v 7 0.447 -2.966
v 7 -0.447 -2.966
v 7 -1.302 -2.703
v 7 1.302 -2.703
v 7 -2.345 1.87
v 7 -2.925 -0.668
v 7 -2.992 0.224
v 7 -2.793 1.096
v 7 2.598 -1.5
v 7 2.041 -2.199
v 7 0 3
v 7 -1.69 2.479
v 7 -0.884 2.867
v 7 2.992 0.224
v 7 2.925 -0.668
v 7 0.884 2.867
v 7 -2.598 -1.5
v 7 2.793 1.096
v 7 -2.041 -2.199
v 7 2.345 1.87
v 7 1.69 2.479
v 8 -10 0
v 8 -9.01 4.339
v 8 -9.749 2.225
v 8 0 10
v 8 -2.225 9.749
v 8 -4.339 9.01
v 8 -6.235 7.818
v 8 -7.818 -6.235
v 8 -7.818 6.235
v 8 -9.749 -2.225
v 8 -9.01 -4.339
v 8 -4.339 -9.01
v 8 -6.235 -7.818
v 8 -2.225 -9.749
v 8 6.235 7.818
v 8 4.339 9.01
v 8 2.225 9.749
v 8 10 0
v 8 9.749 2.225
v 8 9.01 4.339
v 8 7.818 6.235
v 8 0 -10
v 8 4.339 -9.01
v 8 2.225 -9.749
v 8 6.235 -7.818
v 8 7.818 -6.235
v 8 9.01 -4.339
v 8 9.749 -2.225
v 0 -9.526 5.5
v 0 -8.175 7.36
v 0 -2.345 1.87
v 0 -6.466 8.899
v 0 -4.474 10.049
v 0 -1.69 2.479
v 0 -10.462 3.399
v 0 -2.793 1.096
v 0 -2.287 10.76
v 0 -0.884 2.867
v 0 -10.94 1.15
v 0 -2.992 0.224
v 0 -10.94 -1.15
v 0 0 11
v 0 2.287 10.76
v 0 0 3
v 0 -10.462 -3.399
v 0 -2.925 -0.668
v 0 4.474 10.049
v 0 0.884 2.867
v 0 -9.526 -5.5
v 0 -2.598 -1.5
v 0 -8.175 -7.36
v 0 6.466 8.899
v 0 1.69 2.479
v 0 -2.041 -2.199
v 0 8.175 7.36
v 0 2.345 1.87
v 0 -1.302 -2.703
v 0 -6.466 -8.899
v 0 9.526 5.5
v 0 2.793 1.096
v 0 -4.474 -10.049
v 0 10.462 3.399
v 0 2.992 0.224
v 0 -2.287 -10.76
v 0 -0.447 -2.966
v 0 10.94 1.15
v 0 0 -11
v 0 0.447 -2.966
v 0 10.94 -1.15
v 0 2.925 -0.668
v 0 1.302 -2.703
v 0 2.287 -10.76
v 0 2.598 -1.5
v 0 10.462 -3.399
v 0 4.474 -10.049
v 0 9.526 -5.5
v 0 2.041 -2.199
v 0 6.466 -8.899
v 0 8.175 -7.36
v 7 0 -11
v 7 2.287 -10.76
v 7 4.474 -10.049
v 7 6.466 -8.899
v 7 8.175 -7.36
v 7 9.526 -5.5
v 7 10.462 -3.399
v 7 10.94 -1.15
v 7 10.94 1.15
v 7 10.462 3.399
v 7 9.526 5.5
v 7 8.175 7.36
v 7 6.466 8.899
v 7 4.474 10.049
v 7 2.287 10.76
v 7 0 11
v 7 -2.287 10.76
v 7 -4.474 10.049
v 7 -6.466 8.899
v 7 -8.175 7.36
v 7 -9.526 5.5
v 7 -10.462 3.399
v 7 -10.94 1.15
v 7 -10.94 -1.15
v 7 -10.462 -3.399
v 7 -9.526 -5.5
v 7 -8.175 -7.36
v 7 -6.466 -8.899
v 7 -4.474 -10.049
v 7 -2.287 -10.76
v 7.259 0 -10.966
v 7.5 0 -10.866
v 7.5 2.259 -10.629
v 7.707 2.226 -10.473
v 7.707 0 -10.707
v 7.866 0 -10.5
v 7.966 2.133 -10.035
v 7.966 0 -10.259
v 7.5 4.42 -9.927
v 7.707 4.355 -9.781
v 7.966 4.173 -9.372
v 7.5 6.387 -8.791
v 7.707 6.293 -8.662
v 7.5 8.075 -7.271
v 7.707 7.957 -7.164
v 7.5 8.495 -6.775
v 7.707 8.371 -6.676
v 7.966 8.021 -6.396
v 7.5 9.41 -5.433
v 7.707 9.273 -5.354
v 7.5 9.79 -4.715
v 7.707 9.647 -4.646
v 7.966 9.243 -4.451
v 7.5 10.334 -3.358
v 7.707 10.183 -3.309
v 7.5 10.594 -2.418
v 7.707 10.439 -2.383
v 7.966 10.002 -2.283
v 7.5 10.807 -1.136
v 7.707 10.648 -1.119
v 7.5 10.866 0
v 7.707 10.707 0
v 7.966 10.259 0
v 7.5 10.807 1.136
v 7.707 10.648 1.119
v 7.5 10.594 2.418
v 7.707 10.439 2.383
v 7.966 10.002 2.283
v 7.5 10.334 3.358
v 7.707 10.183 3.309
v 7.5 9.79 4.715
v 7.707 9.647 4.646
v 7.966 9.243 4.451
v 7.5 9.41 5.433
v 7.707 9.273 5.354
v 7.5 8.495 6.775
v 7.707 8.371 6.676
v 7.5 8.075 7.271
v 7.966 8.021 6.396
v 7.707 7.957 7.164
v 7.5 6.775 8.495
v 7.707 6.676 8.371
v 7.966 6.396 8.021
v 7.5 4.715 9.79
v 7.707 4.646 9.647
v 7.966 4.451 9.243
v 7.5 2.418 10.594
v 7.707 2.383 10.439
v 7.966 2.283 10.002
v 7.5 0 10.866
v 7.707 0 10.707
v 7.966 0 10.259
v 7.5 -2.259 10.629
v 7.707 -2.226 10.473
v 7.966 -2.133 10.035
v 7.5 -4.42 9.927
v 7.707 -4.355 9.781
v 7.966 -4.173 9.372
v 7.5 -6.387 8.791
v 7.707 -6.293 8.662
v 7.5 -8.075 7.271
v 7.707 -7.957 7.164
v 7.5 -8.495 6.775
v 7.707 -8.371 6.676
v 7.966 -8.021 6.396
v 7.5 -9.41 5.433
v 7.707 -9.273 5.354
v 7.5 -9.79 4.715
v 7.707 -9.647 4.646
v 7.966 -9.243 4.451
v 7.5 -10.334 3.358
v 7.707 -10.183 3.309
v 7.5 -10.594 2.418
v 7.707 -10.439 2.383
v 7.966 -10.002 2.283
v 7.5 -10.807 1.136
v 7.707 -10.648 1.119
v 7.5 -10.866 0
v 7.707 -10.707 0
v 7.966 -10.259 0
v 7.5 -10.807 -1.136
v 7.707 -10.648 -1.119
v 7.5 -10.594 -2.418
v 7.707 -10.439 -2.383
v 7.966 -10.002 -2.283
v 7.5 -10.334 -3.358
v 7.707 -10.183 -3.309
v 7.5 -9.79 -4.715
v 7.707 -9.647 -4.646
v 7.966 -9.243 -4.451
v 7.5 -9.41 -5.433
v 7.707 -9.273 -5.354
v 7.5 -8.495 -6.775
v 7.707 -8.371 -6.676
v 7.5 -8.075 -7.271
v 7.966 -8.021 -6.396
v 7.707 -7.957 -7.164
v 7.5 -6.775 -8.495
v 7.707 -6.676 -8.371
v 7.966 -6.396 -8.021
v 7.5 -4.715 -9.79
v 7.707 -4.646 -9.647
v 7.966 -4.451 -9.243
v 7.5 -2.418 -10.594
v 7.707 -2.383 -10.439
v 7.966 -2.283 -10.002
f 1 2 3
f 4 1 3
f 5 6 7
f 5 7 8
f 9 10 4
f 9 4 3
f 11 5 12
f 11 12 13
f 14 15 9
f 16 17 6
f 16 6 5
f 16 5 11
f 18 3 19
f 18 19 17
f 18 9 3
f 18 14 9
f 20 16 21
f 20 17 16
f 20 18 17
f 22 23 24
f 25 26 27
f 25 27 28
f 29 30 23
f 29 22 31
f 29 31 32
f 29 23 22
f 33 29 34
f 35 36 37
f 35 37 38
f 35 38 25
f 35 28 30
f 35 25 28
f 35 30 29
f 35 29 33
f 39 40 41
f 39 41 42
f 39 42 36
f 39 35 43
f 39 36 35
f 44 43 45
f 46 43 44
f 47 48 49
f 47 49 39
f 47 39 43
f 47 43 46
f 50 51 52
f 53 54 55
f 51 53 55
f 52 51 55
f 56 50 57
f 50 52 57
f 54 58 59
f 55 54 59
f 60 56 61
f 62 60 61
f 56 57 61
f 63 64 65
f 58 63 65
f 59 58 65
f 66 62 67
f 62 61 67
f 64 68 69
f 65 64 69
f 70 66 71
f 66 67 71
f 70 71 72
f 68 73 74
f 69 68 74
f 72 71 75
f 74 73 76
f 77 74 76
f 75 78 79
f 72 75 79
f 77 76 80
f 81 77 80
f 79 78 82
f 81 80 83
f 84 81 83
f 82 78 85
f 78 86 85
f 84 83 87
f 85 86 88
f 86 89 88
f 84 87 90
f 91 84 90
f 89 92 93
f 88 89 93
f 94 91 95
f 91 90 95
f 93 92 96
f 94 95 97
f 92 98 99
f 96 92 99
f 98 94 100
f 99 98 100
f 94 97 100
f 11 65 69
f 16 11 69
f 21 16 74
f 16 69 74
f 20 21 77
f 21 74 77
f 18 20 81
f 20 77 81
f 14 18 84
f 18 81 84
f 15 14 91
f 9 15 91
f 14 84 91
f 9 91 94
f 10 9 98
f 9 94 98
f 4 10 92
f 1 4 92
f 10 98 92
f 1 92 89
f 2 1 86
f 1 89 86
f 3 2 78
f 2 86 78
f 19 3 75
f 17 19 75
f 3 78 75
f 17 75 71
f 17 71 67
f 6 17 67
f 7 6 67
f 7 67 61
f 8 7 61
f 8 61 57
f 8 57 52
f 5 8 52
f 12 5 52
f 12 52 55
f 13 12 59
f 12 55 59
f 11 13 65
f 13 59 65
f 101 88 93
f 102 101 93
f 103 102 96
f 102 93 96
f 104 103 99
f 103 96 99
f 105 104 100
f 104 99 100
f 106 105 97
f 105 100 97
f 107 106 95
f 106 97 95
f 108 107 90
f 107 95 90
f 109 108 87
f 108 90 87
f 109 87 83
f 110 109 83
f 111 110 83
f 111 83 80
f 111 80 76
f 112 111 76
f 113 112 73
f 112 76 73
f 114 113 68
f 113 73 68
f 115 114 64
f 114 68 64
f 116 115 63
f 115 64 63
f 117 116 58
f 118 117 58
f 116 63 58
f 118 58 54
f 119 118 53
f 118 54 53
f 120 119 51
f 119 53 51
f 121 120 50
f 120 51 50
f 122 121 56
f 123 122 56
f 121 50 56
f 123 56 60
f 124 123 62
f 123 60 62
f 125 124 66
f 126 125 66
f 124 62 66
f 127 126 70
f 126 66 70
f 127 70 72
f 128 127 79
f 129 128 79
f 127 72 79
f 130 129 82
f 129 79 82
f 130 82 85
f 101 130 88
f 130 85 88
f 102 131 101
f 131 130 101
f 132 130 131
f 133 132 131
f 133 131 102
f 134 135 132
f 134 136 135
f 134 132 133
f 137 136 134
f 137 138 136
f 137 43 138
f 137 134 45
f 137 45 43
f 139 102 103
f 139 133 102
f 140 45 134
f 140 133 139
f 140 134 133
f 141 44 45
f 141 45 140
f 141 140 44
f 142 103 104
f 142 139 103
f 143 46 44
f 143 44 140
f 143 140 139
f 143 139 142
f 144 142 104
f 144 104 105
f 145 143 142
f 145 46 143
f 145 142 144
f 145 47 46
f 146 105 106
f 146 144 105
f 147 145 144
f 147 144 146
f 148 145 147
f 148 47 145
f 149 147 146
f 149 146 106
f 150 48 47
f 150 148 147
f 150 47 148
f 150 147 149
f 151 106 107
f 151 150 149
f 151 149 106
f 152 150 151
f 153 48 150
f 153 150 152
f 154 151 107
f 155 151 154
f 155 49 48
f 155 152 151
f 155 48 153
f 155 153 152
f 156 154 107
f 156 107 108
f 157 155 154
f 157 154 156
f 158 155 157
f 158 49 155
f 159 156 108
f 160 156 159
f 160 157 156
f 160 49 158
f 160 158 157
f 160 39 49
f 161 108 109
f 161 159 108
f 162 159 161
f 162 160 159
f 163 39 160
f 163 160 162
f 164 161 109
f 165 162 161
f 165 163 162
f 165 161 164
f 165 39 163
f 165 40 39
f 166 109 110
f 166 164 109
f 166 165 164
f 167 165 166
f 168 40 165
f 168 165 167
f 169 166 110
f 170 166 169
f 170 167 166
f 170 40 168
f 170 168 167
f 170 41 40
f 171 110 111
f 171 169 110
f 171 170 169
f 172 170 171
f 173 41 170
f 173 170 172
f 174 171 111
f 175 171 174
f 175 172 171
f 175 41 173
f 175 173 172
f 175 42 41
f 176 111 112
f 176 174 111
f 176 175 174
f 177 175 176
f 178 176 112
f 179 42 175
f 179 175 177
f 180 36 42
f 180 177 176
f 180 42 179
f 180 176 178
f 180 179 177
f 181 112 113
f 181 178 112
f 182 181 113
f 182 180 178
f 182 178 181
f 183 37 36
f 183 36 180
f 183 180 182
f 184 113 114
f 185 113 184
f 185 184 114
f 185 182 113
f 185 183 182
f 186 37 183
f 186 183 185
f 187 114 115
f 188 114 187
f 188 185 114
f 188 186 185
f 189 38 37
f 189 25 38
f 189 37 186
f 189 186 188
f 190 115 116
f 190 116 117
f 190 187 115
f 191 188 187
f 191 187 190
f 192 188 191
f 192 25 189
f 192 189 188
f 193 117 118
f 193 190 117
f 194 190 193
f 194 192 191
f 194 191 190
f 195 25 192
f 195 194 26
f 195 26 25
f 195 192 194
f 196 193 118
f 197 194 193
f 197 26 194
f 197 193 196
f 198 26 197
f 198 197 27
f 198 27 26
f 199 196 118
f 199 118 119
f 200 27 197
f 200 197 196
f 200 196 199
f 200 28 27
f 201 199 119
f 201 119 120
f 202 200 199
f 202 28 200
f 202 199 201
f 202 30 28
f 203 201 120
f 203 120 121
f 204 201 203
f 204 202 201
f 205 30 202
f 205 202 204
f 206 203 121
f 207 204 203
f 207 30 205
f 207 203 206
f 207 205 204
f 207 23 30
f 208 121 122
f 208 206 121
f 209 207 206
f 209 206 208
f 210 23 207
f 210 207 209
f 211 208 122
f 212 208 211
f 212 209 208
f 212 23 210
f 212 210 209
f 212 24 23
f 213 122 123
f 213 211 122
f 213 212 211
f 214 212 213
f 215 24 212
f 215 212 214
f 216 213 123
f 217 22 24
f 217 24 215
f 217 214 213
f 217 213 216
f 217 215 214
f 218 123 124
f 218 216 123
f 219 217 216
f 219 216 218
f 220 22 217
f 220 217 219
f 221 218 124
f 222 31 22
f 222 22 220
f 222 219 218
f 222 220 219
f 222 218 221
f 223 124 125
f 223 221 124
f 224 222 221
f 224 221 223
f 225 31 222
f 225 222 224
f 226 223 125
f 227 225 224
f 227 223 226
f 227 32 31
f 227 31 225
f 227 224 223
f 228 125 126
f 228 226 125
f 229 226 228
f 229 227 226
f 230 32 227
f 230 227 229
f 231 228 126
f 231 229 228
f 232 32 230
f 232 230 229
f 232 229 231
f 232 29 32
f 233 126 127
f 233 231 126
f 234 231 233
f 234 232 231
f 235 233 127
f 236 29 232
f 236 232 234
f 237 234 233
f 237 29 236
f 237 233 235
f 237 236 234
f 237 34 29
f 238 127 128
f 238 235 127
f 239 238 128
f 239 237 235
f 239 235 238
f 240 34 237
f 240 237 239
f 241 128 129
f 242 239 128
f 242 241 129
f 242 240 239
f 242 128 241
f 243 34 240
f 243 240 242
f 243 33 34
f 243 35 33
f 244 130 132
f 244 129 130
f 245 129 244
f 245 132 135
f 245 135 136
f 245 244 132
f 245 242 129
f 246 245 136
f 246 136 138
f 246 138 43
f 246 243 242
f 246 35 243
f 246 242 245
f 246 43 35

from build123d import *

# Parameters (mm, degrees)
SKETCH1_R           = 11
BOSS_EXTRUDE1_DEPTH = 8
SKETCH2_R           = 3
CUT_EXTRUDE1_DEPTH  = 7
FILLET1_R           = 1


with BuildPart() as part:
    # Sketch1 → Boss-Extrude1 (new body)
    with BuildSketch(Plane(origin=(0, 0, 0), x_dir=(0, 0, -1), z_dir=(1, 0, 0))):
        Circle(SKETCH1_R)
    extrude(amount=BOSS_EXTRUDE1_DEPTH)

    # Sketch2 → Cut-Extrude1 (cut)
    with BuildSketch(Plane.ZY):
        Circle(SKETCH2_R)
    extrude(amount=-CUT_EXTRUDE1_DEPTH, mode=Mode.SUBTRACT)

    # Fillet1
    fillet1_edges = [part.edges().sort_by_distance(p)[0] for p in [
        (8, 0, 11),
    ]]
    fillet(fillet1_edges, radius=FILLET1_R)


solid = part.part
